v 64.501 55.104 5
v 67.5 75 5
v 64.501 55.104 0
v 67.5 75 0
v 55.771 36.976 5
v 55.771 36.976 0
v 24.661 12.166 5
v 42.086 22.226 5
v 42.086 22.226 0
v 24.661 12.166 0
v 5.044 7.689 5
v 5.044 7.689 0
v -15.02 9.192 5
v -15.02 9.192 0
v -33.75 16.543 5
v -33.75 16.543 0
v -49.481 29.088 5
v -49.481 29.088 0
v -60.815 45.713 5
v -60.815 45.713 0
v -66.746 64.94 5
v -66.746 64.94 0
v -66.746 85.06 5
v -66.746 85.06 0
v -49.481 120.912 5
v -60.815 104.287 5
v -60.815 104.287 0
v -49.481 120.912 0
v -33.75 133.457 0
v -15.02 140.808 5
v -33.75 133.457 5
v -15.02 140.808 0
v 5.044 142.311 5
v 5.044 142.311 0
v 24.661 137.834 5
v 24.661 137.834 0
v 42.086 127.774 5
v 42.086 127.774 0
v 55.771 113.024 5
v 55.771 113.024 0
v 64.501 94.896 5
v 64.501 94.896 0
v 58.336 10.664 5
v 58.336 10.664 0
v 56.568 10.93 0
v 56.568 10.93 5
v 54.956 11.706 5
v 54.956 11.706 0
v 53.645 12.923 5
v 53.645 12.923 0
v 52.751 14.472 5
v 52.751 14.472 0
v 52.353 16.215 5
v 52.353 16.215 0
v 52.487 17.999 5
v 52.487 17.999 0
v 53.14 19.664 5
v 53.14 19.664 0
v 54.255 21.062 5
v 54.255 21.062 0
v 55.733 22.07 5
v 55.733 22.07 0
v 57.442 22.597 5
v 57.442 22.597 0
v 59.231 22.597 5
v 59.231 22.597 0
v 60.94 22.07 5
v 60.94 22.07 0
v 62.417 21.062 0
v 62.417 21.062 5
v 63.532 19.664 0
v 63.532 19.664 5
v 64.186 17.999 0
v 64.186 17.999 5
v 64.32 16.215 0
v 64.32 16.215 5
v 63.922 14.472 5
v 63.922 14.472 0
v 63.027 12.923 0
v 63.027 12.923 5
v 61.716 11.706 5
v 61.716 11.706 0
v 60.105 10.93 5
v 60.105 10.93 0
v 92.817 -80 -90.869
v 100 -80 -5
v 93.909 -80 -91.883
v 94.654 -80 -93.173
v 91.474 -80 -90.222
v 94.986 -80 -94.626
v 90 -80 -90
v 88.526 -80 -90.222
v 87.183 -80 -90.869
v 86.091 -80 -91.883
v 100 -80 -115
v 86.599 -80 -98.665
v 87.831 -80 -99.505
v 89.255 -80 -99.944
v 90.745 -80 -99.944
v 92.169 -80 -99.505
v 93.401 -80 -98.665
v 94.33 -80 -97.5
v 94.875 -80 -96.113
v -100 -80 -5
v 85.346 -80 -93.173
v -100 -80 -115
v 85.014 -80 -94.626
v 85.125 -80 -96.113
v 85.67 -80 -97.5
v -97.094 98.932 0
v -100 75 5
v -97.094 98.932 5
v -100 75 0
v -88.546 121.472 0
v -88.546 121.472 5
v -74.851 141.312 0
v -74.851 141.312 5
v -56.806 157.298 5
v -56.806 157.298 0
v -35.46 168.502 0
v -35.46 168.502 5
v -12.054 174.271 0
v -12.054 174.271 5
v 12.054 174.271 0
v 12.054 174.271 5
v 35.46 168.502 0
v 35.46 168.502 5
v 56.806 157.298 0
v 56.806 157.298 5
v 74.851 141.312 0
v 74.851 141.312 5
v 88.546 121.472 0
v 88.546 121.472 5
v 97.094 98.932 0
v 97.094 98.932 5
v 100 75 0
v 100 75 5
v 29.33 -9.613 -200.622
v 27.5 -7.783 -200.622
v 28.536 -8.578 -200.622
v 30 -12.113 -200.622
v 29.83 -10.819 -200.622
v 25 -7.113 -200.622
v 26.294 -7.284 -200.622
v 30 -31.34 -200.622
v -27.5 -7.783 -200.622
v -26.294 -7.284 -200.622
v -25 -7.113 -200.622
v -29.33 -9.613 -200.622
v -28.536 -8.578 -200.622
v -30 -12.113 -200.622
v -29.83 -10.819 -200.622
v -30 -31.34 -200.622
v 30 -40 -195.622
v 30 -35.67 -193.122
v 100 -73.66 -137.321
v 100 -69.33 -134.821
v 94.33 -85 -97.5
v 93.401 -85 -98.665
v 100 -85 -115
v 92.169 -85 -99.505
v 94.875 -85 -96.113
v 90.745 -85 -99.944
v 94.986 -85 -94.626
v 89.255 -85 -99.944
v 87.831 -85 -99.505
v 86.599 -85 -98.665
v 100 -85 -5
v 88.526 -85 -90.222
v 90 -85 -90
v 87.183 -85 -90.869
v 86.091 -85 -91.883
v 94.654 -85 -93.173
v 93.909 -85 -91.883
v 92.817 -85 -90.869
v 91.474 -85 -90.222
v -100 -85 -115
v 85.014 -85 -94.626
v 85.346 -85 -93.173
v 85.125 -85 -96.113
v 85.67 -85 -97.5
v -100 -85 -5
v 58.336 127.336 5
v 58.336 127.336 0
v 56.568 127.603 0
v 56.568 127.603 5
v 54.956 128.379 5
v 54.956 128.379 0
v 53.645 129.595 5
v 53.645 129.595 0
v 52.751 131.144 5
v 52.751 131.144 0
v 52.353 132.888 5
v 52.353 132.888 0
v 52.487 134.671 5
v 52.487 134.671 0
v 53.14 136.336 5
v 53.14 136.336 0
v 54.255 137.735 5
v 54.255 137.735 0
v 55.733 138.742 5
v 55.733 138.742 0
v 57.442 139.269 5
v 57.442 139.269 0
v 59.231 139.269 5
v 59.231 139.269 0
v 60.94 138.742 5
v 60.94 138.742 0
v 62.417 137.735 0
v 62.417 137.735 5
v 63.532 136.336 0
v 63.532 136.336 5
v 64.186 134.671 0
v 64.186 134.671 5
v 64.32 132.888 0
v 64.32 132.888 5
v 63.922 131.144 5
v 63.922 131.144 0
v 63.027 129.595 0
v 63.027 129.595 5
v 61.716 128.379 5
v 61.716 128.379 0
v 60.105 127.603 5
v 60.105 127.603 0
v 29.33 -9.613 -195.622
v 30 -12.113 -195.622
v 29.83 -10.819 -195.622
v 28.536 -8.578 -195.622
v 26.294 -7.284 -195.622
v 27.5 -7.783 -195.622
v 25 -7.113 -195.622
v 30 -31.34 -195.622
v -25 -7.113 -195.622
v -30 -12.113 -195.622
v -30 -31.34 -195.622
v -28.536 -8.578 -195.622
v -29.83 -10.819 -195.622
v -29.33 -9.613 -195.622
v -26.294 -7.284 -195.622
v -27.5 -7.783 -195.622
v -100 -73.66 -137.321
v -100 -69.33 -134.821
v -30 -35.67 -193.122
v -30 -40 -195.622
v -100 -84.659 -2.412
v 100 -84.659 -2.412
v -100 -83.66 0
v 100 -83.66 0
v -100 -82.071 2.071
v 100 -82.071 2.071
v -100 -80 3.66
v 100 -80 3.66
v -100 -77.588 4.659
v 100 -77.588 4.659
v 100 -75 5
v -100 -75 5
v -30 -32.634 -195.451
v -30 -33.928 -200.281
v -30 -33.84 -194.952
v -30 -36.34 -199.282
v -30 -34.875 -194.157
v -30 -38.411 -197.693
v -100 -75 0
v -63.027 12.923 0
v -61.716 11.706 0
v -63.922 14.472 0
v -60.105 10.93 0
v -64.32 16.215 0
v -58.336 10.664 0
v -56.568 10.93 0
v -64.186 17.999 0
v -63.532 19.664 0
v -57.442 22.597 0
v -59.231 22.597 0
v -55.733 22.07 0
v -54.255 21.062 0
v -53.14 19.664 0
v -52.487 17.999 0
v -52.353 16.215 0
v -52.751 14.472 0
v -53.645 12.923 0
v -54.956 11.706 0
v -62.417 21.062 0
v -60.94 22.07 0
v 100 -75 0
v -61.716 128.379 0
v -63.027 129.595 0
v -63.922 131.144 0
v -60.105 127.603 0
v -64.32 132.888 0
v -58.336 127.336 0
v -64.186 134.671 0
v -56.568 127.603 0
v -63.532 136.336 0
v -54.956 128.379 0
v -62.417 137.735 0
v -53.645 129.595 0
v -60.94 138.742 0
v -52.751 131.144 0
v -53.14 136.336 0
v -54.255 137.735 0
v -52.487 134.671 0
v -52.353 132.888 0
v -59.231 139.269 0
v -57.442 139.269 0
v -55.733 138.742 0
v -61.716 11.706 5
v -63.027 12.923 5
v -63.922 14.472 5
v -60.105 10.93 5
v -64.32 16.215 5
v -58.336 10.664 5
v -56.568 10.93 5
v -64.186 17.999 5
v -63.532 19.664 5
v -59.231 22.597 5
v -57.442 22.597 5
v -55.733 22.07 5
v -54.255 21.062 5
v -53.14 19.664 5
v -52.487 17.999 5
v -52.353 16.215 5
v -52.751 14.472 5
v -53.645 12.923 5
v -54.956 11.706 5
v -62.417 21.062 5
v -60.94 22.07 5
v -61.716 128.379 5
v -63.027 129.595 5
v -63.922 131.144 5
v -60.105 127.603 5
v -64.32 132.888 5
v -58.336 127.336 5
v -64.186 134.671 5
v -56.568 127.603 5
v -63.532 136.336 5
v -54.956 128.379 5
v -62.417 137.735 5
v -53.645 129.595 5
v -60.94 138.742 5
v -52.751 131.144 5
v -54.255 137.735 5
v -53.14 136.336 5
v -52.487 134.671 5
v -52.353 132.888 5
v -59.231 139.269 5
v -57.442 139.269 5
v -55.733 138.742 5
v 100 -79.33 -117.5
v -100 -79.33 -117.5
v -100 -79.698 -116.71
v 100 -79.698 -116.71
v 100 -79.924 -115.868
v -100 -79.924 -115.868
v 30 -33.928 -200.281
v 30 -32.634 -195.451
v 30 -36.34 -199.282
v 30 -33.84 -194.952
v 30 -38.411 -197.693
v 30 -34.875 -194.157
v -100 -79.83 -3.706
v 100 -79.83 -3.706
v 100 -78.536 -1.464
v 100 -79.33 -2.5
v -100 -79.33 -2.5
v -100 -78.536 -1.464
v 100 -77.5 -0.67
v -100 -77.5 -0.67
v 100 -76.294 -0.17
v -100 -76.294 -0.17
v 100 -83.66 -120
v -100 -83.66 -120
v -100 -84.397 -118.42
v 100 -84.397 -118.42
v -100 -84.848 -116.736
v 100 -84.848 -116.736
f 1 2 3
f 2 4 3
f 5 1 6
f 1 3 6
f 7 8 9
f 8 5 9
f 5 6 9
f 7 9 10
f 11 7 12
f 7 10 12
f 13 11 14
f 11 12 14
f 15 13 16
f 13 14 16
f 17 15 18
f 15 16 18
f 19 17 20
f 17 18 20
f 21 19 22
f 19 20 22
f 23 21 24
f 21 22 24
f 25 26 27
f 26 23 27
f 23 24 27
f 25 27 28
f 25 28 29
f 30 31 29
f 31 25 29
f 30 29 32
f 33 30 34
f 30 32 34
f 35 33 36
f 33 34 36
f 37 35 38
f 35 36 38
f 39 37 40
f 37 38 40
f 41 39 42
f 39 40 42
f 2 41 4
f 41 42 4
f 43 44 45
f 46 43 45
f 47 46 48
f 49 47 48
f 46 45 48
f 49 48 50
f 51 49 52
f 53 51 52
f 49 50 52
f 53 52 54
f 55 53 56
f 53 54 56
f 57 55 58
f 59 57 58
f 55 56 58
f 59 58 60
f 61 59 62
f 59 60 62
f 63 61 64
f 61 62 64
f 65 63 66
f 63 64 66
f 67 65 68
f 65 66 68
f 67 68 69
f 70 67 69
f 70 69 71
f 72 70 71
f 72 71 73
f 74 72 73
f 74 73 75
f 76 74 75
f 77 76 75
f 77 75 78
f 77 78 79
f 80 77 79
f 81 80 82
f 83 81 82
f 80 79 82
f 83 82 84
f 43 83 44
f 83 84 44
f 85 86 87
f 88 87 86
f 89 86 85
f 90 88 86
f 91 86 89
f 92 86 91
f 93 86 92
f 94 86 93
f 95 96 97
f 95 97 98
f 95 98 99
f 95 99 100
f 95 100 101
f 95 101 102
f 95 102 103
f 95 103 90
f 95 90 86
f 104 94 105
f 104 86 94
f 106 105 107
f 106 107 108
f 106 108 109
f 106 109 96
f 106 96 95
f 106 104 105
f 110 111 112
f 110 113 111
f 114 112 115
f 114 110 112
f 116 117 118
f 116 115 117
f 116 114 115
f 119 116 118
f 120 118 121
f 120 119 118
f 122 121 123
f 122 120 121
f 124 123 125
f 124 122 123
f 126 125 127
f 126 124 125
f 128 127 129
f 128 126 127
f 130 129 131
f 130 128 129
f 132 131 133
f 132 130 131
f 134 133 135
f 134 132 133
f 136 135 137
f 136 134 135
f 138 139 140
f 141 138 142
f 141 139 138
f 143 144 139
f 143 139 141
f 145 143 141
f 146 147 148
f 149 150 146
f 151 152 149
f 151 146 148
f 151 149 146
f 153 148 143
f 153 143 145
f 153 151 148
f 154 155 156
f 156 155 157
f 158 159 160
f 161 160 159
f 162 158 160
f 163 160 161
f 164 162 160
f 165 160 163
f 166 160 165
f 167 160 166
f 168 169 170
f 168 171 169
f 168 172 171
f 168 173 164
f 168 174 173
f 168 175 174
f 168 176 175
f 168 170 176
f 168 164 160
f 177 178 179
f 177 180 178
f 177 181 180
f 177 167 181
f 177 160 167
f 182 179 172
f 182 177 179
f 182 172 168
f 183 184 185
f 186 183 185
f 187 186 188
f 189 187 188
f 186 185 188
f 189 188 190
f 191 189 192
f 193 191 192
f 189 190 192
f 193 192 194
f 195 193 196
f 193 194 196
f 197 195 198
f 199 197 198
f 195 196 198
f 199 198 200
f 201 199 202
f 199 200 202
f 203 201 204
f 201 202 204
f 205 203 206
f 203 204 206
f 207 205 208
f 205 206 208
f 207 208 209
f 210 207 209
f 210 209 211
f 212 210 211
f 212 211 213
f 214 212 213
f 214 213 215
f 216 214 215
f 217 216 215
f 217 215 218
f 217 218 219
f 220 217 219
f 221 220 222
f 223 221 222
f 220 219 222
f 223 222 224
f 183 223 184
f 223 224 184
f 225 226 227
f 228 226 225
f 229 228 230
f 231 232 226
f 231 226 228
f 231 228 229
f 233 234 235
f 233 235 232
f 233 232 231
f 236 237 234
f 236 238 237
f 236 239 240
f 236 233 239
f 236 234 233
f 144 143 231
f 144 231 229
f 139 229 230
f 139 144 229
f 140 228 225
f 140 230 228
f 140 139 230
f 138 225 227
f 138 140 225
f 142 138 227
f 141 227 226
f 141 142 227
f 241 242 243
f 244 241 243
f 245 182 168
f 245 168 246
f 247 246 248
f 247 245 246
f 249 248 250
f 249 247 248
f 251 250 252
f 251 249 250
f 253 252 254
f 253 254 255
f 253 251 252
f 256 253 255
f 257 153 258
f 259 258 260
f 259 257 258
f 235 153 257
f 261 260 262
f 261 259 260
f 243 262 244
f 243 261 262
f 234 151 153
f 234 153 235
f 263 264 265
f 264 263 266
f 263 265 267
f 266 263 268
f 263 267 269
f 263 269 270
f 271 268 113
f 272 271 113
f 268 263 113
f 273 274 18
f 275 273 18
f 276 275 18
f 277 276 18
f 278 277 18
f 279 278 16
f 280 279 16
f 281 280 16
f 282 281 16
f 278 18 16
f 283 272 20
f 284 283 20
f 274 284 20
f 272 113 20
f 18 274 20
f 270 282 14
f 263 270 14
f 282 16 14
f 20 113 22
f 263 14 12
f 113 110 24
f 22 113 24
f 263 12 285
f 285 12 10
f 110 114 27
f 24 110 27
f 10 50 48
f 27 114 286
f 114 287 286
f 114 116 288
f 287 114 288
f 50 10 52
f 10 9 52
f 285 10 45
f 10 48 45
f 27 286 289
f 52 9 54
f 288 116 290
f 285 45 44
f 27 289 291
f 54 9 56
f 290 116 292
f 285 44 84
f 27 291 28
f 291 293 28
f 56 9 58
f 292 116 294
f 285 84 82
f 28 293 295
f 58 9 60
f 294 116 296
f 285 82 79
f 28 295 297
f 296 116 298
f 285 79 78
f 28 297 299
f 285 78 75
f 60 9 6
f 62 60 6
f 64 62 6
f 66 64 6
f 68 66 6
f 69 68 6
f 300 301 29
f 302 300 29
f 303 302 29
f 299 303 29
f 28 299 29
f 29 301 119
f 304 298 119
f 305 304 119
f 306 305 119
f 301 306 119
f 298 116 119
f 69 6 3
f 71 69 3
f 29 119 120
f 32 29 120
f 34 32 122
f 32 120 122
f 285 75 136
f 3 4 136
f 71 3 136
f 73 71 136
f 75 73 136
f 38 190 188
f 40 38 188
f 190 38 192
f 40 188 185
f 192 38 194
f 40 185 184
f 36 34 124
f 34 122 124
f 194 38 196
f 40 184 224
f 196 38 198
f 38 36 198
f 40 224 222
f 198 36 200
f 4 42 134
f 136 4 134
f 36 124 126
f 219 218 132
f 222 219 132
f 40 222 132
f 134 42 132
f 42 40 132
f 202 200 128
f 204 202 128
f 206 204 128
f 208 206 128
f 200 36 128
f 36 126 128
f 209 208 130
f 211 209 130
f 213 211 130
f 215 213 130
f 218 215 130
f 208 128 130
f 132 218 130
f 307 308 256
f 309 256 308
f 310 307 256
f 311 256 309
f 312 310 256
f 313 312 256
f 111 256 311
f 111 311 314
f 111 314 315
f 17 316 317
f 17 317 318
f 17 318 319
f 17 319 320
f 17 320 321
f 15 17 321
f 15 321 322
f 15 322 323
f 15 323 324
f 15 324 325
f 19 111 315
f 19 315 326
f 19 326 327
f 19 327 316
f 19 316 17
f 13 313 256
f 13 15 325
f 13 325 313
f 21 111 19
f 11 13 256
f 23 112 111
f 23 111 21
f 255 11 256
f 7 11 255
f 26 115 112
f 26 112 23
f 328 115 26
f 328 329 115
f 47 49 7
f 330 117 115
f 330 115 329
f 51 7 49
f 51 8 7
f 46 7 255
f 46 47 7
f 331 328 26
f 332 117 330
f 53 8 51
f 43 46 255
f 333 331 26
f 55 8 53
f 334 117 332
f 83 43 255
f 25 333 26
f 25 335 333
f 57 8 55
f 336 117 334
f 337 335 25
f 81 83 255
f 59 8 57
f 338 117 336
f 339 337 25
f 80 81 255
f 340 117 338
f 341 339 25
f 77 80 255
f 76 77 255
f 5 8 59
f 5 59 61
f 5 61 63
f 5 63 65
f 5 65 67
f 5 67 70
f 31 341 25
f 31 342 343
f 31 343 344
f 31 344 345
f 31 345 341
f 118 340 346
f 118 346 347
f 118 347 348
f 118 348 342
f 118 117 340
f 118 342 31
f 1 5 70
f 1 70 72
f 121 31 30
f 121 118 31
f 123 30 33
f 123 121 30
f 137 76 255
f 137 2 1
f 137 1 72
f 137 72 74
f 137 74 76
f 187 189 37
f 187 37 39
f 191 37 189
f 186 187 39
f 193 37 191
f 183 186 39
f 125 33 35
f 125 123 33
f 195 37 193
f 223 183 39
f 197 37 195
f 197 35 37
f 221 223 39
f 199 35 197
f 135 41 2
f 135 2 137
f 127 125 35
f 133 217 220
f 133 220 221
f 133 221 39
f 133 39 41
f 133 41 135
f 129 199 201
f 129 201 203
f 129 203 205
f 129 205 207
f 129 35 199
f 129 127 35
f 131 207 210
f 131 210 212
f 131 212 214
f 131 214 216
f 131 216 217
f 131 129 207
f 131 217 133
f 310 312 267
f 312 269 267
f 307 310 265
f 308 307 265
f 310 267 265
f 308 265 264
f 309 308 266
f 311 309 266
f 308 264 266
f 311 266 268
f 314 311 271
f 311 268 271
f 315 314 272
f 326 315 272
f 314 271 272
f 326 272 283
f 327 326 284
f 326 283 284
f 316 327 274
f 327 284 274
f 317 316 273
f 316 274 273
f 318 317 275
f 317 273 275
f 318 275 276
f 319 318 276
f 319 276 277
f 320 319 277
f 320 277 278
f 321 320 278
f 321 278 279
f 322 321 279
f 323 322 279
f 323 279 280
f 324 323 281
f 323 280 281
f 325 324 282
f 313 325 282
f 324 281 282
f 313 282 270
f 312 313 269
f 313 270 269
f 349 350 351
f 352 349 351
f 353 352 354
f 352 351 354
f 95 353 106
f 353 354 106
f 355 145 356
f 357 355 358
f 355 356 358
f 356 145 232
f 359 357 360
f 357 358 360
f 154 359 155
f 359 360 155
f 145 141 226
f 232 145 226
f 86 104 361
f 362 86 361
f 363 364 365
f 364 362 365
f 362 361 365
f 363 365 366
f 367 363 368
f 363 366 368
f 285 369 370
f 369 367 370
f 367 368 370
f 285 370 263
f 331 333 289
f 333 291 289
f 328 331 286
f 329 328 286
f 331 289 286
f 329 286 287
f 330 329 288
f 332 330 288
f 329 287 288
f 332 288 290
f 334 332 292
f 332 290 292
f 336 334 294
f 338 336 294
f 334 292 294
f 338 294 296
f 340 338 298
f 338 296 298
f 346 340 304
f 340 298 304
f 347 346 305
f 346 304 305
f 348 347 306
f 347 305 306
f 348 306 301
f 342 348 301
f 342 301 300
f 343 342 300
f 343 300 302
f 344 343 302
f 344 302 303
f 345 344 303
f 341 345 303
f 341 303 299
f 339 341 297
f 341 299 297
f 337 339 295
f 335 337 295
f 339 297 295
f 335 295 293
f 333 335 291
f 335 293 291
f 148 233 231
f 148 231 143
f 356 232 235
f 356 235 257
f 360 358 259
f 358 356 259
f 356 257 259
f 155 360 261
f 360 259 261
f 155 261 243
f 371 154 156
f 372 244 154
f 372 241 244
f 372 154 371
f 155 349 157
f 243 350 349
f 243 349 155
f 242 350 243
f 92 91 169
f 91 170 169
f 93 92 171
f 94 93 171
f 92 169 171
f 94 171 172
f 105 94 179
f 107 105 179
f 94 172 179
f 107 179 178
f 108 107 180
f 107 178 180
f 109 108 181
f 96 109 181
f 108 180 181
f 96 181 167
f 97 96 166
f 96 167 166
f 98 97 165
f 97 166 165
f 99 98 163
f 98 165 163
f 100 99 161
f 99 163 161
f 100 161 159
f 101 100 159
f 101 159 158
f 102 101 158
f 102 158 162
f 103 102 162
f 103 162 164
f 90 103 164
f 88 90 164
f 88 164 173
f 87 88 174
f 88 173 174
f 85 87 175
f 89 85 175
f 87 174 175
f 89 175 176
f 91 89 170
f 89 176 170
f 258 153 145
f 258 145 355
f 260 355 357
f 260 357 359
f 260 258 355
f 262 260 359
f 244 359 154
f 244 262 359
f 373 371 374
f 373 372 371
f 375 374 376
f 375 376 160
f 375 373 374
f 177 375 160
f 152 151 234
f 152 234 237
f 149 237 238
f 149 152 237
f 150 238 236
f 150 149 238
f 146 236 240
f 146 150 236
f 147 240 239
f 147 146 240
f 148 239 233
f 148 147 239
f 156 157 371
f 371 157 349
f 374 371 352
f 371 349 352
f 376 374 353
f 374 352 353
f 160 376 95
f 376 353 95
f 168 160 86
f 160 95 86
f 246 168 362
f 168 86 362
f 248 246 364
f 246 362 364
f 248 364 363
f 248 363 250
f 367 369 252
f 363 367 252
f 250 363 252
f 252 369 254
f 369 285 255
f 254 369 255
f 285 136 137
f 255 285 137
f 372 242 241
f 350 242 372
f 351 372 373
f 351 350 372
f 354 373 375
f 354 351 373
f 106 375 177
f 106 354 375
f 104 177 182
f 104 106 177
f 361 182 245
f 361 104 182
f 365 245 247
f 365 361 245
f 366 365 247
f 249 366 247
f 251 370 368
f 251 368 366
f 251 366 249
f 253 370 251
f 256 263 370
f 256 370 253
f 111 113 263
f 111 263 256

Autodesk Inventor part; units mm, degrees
ref_plane "YZ Plane" through (0, 0, 0) normal (1, 0, 0) x (0, 1, 0)
ref_plane "XZ Plane" through (0, 0, 0) normal (0, 1, 0) x (-1, 0, 0)
ref_plane "XY Plane" through (0, 0, 0) normal (0, 0, 1) x (1, 0, 0)
sketch "Schizzo1" plane through (0, 0, 0) normal (0, 0, 1) x (1, 0, 0)
  line L0 (100, 75) -> (100, -75)
  line L1 (100, -75) -> (-100, -75)
  line L2 (-100, -75) -> (-100, 75)
  line L3 (-100, 75) -> (100, -75) construction
  line L4 (100, 75) -> (-100, -75) construction
  arc A0 (100, 75) -> (-100, 75) centre (0, 75) ccw
  circle A1 centre (0, 75) radius 67.5
  point P0 (0, 0)
  point P1 (0, 0)
  dimension "d0" = 200
  dimension "d1" = 150
  dimension "d3" = 100
  dimension "d4" = 135
extrude "Piano2" add sketch "Schizzo1" along normal blind 5
sketch "Schizzo2" plane through (-100, -80, -5) normal (0, -1, 0) x (1, 0, 0)
  line L0 (200, 0) -> (0, 0)
  line L1 (0, 0) -> (0, -110)
  line L2 (0, -110) -> (200, -110)
  line L3 (200, -110) -> (200, 0)
edge flange "Flangia1" height 120 angle 90 thickness 5 bend radius 5 thickness toward (0, -1, 0) relief tear relief width 5 relief depth 2.5 edges at (0, -75, 0) wall of the first edge with corners at (100, -80, -5) (-100, -80, -5) (-100, -80, -115) (100, -80, -115)
bend "Piega (Bend)1"
corner "Angolo1"
sketch "Schizzo3" plane through (-100, -79.3301, -117.5) normal (0, -0.8660254, -0.5) x (1, 0, 0)
  line L0 (200, 0) -> (0, 0)
  line L1 (0, 0) -> (0, -87.3205)
  line L2 (0, -87.3205) -> (200, -87.3205)
  line L3 (200, -87.3205) -> (200, 0)
edge flange "Flangia2" height 90 angle 30 thickness 5 bend radius 5 thickness toward (0, -0.8660254, -0.5) relief tear relief width 5 relief depth 2.5 edges at (0, -80, -115) wall of the first edge with corners at (100, -79.3301, -117.5) (-100, -79.3301, -117.5) (-100, -35.6699, -193.1218) (100, -35.6699, -193.1218)
bend "Piega (Bend)2"
corner "Angolo2"
sketch "Schizzo5" plane through (0, 0, 5) normal (0, 0, 1) x (1, 0, 0)
  circle A0 centre (58.3363, 133.3363) radius 6 projected
  circle A1 centre (-58.3363, 133.3363) radius 6 projected
  circle A2 centre (-58.3363, 16.6637) radius 6 projected
  circle A3 centre (58.3363, 16.6637) radius 6 projected
  point P0 (0, 0)
hole "Foro1" at (-58.3363, 133.3363, 5) at (58.3363, 133.3363, 5) at (58.3363, 16.6637, 5) at (-58.3363, 16.6637, 5) direction (0, 0, -1) diameter 12 end through all
sketch "Schizzo6" plane through (-100, -35.6699, -193.1218) normal (0, 0.8660254, 0.5) x (1, 0, 0)
  line L0 (200, 0) -> (0, 0) projected
  line L1 (100, 0) -> (130, 0)
  line L2 (130, 0) -> (200, -67.3205)
  line L3 (100, 0) -> (70, 0)
  line L4 (0, 0) -> (0, -87.3205) projected
  line L5 (0, -67.3205) -> (70, 0)
  line L6 (200, -67.3205) -> (200, 19.9941)
  line L7 (200, 19.9941) -> (0, 19.9941)
  line L8 (0, 19.9941) -> (0, -67.3205)
  point P0 (100, -149.4134)
  point P1 (200, -87.3205)
  dimension "d43" = 20
  dimension "d44" = 30
  dimension "d45" = 30
  dimension "d46" = 20
extrude "Taglia1" cut sketch "Schizzo6" against normal blind 5
sketch "Schizzo7" plane through (-30, -31.3397, -195.6218) normal (0, 0, -1) x (-1, 0, 0)
  line L0 (-60, 0) -> (0, 0)
  line L1 (0, 0) -> (0, 24.2265)
  line L2 (0, 24.2265) -> (-60, 24.2265)
  line L3 (-60, 24.2265) -> (-60, 0)
edge flange "Flangia4" height 30 angle 60 thickness 5 bend radius 5 thickness toward (0, 0, -1) relief tear relief width 5 relief depth 2.5 edges at (0, -35.6699, -193.1218) wall of the first edge with corners at (30, -31.3397, -195.6218) (-30, -31.3397, -195.6218) (-30, -7.1132, -195.6218) (30, -7.1132, -195.6218)
bend "Piega (Bend)4"
corner "Angolo4"
fillet "Arrotondamento angolo1" radius 5 2 edges at (30, -7.1132, -198.1218) (-30, -7.1132, -198.1218)
sketch "Schizzo8" plane through (-100, -80, -5) normal (0, 1, 0) x (1, 0, 0)
  circle A0 centre (190, 90) radius 2.5 projected
  point P0 (100, -5)
hole "Foro2" at (90, -80, -95) direction (0, -1, 0) diameter 10 end through all
equation "\"d41\" = Spessore"
equation "\"d47\" = Spessore"
equation "\"d65\" = Spessore"
equation "\"d5\" = Spessore"
equation "\"d6\" = LarghezzaScaricoPiega"
equation "\"d7\" = ProfonditàScaricoPiega"
equation "\"d8\" = ResiduoMinimo"
equation "\"d9\" = RaggioTransizione"
equation "\"d12\" = RaggioPiega"
equation "\"d13\" = DimensioniScaricoAngolo"
equation "\"d14\" = DimensioneGioco"
equation "\"d15\" = Dimensione_raggio_Jacobi"
equation "\"d16\" = LarghezzaScaricoPiega"
equation "\"d17\" = ProfonditàScaricoPiega"
equation "\"d18\" = ResiduoMinimo"
equation "\"d19\" = RaggioTransizione"
equation "\"d22\" = RaggioPiega"
equation "\"d23\" = DimensioniScaricoAngolo"
equation "\"d24\" = DimensioneGioco"
equation "\"d25\" = Dimensione_raggio_Jacobi"
equation "\"d49\" = LarghezzaScaricoPiega"
equation "\"d50\" = ProfonditàScaricoPiega"
equation "\"d51\" = ResiduoMinimo"
equation "\"d52\" = RaggioTransizione"
equation "\"d55\" = RaggioPiega"
equation "\"d56\" = DimensioniScaricoAngolo"
equation "\"d57\" = DimensioneGioco"
equation "\"d58\" = Dimensione_raggio_Jacobi"
equation "\"RaggioPiega\" = Spessore"
equation "\"LarghezzaScaricoPiega\" = Spessore"
equation "\"ProfonditàScaricoPiega\" = 0.5 * Spessore"
equation "\"RaggioTransizione\" = RaggioPiega"
equation "\"Dimensione_raggio_Jacobi\" = RaggioPiega"
equation "\"DimensioneGioco\" = Spessore"
equation "\"Spessore\" = 5"
equation "\"ResiduoMinimo\" = 10"
equation "\"DimensioniScaricoAngolo\" = 20"
properties part number "Lamiera supporto motore" material "Acciaio inossidabile"
